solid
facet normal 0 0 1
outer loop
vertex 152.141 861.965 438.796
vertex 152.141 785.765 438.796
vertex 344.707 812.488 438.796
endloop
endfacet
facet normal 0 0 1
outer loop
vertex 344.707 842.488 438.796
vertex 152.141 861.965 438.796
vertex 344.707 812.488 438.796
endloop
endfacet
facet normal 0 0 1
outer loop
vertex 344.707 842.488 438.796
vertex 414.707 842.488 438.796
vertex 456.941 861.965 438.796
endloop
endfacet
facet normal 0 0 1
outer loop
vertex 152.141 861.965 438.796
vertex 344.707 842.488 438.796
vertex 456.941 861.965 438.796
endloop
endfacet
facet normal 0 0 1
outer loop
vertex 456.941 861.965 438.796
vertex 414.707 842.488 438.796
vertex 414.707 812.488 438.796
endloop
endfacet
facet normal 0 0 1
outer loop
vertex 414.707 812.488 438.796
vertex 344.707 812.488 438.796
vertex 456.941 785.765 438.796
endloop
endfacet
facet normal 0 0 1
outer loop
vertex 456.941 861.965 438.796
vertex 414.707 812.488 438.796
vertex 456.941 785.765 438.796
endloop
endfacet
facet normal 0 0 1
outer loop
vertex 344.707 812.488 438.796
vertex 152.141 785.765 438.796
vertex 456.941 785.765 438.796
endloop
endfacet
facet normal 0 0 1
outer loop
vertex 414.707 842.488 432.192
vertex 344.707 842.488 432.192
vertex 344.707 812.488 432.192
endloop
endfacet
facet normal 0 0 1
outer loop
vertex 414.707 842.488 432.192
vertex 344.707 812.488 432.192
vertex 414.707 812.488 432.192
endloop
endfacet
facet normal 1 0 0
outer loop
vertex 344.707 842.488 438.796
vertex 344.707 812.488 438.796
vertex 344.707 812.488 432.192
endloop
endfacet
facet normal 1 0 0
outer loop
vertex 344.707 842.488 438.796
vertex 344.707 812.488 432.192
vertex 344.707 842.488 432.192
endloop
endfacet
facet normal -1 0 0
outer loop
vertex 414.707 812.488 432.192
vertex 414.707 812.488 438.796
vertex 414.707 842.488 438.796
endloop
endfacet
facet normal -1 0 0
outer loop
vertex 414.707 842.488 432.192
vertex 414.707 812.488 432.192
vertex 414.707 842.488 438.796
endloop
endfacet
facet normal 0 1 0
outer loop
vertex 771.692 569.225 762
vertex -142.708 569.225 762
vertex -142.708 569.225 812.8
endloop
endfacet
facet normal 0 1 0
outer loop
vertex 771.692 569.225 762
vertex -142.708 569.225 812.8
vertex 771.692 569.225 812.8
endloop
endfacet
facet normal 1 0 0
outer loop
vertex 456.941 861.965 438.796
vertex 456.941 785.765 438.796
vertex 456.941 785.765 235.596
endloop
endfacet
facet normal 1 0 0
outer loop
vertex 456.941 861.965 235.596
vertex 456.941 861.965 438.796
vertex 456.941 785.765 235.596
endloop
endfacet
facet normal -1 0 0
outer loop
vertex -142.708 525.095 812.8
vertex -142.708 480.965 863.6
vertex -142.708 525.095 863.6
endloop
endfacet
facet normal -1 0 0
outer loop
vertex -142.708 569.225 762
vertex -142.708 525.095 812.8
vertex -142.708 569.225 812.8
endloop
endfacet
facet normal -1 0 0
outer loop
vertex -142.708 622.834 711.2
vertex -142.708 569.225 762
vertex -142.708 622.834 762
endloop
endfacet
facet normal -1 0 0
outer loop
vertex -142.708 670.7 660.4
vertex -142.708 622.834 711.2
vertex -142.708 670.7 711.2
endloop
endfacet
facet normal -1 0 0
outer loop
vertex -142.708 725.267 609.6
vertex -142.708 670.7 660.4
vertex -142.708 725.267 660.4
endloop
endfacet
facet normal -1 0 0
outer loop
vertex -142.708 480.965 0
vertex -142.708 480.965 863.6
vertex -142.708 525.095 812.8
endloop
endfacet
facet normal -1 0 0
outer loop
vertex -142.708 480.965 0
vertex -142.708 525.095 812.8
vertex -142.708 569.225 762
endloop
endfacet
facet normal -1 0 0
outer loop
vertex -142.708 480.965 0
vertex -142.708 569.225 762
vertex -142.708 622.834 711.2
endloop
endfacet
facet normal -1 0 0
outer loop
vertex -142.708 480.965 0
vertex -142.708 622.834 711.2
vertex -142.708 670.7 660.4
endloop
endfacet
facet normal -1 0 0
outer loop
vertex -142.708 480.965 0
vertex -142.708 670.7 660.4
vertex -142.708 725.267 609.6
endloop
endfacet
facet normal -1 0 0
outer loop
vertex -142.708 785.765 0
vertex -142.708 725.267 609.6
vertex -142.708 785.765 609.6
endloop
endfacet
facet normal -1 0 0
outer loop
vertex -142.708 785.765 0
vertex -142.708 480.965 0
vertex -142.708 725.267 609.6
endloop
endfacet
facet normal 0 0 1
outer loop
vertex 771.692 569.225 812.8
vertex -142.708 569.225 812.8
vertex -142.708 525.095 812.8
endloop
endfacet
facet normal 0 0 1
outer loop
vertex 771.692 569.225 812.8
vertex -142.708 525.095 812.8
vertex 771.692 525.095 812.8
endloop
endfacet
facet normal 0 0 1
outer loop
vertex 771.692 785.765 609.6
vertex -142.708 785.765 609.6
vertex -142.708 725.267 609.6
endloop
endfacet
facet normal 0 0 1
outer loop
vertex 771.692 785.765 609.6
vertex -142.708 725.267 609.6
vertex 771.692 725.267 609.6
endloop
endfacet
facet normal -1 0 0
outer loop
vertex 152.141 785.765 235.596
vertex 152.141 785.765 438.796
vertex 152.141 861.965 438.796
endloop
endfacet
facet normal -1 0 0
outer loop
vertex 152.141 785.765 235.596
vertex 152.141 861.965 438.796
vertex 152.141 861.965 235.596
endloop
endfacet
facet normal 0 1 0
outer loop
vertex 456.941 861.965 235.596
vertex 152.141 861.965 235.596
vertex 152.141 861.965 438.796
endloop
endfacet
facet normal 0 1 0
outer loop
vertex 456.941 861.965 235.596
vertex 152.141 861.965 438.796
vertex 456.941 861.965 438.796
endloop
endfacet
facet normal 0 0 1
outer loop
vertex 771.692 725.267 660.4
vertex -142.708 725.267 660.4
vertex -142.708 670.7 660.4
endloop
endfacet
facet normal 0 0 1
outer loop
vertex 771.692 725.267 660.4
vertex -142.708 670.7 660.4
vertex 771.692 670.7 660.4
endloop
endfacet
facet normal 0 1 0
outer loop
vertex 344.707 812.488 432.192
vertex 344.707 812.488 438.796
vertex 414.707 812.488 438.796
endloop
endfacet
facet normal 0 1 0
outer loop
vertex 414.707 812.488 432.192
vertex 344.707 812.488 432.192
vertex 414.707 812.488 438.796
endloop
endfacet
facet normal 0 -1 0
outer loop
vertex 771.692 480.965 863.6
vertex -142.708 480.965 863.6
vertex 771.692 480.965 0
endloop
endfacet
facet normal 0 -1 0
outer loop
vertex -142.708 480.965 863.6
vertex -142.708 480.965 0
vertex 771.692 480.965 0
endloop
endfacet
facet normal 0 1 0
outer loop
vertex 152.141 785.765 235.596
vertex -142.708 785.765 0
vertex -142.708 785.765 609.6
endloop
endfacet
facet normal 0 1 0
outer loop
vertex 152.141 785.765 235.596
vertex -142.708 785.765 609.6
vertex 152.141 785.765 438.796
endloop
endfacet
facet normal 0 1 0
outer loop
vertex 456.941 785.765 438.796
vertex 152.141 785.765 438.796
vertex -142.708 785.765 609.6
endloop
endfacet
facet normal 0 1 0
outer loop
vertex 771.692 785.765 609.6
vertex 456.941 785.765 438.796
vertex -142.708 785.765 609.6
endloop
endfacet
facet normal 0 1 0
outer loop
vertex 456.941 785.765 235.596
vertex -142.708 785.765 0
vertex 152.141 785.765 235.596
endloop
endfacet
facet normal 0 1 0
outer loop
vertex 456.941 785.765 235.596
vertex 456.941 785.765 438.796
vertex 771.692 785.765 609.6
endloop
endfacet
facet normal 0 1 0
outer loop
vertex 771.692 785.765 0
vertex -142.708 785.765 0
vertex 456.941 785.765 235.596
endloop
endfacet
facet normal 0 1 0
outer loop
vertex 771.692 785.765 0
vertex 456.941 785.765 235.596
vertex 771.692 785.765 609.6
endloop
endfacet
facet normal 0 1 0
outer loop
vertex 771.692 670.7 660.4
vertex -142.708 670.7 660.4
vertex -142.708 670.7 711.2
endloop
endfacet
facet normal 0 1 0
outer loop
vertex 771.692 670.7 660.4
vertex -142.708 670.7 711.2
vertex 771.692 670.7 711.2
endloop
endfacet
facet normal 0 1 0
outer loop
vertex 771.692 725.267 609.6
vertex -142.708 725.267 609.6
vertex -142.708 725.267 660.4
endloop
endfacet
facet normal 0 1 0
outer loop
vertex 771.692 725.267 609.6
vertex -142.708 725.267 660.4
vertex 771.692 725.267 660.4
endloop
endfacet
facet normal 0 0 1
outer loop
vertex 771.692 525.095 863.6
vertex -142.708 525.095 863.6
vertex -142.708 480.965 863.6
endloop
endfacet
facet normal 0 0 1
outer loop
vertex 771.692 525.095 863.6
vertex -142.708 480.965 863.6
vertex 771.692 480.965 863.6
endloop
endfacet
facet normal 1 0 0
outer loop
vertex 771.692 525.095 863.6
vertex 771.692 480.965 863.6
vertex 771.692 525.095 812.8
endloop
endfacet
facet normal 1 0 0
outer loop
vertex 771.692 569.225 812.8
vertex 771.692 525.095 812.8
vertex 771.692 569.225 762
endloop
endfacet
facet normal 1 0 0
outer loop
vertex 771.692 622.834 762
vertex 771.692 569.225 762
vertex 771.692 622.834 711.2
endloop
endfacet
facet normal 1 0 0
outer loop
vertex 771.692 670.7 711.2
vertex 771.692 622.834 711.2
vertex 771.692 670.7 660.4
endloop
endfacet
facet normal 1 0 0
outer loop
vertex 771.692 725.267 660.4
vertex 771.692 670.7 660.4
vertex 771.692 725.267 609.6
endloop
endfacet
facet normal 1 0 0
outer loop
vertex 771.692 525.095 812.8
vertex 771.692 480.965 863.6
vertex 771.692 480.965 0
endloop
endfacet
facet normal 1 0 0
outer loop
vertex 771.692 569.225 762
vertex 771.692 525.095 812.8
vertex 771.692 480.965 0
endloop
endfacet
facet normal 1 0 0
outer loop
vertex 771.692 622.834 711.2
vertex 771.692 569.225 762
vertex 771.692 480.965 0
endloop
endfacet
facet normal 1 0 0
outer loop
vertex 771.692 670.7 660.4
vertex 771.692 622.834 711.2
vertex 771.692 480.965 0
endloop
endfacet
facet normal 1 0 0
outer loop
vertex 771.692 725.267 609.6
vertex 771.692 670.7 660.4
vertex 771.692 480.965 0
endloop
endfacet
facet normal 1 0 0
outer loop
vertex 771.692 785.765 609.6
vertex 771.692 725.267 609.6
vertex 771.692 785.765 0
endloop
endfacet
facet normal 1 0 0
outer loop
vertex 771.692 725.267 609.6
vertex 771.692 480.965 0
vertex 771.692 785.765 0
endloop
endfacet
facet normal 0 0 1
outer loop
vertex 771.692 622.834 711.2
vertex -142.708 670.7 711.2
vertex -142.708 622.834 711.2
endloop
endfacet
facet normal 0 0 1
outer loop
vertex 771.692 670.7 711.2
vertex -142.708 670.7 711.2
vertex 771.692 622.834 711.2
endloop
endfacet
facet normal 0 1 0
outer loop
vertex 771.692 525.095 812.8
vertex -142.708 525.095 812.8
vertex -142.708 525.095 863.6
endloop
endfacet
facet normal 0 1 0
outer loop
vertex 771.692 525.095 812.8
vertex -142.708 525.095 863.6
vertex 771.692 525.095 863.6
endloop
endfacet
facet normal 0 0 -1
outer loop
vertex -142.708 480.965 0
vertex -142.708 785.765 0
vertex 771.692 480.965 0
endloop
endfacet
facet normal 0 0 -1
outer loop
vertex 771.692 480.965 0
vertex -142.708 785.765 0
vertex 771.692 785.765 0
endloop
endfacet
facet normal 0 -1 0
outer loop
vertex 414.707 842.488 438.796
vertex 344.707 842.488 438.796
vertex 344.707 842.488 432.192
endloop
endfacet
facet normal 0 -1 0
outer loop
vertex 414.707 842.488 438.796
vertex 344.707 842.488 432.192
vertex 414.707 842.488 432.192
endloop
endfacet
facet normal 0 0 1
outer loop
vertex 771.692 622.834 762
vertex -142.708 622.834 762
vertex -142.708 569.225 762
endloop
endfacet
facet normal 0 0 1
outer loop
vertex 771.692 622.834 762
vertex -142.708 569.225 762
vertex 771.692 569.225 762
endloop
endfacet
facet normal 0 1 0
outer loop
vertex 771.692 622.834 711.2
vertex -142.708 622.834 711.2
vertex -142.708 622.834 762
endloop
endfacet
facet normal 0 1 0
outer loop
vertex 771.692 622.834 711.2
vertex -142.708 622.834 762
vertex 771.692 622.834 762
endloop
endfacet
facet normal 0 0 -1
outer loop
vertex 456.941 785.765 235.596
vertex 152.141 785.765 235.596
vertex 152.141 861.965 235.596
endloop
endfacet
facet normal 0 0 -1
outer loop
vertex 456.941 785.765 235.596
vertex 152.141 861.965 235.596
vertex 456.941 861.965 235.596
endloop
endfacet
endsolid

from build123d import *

# Parameters (mm, degrees)
SKETCH2_W           = 914.4
SKETCH2_H           = 304.8
BOSS_EXTRUDE3_DEPTH = 609.6
SKETCH3_W           = 914.4
SKETCH3_H           = 244.302361722
BOSS_EXTRUDE4_DEPTH = 50.8
SKETCH4_W           = 914.4
SKETCH4_H           = 189.735334449
BOSS_EXTRUDE5_DEPTH = 50.8
SKETCH5_W           = 914.4
SKETCH5_H           = 141.869521053
BOSS_EXTRUDE6_DEPTH = 50.8
SKETCH6_W           = 914.4
SKETCH6_H           = 88.259810048
BOSS_EXTRUDE7_DEPTH = 50.8
SKETCH7_W           = 914.4
SKETCH7_H           = 44.129905024
BOSS_EXTRUDE8_DEPTH = 50.8
SKETCH8_W           = 304.8
SKETCH8_H           = 203.2
BOSS_EXTRUDE9_DEPTH = 76.2
SKETCH9_W           = 70
SKETCH9_H           = 30
CUT_EXTRUDE1_DEPTH  = 6.604


with BuildPart() as part:
    # Sketch2 → Boss-Extrude3 (new body)
    with BuildSketch(Plane.XY):
        with Locations((314.492107476, 633.364976232)):
            Rectangle(SKETCH2_W, SKETCH2_H)
    extrude(amount=BOSS_EXTRUDE3_DEPTH)

    # Sketch3 → Boss-Extrude4 (add)
    with BuildSketch(Plane.XY.offset(609.6)):
        with Locations((314.492107476, 603.116157093)):
            Rectangle(SKETCH3_W, SKETCH3_H)
    extrude(amount=BOSS_EXTRUDE4_DEPTH)

    # Sketch4 → Boss-Extrude5 (add)
    with BuildSketch(Plane.XY.offset(660.4)):
        with Locations((314.492107476, 575.832643457)):
            Rectangle(SKETCH4_W, SKETCH4_H)
    extrude(amount=BOSS_EXTRUDE5_DEPTH)

    # Sketch5 → Boss-Extrude6 (add)
    with BuildSketch(Plane.XY.offset(711.2)):
        with Locations((314.492107476, 551.899736759)):
            Rectangle(SKETCH5_W, SKETCH5_H)
    extrude(amount=BOSS_EXTRUDE6_DEPTH)

    # Sketch6 → Boss-Extrude7 (add)
    with BuildSketch(Plane.XY.offset(762)):
        with Locations((314.492107476, 525.094881256)):
            Rectangle(SKETCH6_W, SKETCH6_H)
    extrude(amount=BOSS_EXTRUDE7_DEPTH)

    # Sketch7 → Boss-Extrude8 (add)
    with BuildSketch(Plane.XY.offset(812.8)):
        with Locations((314.492107476, 503.029928744)):
            Rectangle(SKETCH7_W, SKETCH7_H)
    extrude(amount=BOSS_EXTRUDE8_DEPTH)

    # Sketch8 → Boss-Extrude9 (add)
    with BuildSketch(Plane(origin=(0, 785.764976232, 0), x_dir=(1, 0, 0), z_dir=(0, 1, 0))):
        with Locations((304.540679121, -337.195909304)):
            Rectangle(SKETCH8_W, SKETCH8_H)
    extrude(amount=BOSS_EXTRUDE9_DEPTH)

    # Sketch9 → Cut-Extrude1 (cut)
    with BuildSketch(Plane.XY.offset(438.795909304)):
        with Locations((379.707122213, 827.488030004)):
            Rectangle(SKETCH9_W, SKETCH9_H)
    extrude(amount=-CUT_EXTRUDE1_DEPTH, mode=Mode.SUBTRACT)


solid = part.part
